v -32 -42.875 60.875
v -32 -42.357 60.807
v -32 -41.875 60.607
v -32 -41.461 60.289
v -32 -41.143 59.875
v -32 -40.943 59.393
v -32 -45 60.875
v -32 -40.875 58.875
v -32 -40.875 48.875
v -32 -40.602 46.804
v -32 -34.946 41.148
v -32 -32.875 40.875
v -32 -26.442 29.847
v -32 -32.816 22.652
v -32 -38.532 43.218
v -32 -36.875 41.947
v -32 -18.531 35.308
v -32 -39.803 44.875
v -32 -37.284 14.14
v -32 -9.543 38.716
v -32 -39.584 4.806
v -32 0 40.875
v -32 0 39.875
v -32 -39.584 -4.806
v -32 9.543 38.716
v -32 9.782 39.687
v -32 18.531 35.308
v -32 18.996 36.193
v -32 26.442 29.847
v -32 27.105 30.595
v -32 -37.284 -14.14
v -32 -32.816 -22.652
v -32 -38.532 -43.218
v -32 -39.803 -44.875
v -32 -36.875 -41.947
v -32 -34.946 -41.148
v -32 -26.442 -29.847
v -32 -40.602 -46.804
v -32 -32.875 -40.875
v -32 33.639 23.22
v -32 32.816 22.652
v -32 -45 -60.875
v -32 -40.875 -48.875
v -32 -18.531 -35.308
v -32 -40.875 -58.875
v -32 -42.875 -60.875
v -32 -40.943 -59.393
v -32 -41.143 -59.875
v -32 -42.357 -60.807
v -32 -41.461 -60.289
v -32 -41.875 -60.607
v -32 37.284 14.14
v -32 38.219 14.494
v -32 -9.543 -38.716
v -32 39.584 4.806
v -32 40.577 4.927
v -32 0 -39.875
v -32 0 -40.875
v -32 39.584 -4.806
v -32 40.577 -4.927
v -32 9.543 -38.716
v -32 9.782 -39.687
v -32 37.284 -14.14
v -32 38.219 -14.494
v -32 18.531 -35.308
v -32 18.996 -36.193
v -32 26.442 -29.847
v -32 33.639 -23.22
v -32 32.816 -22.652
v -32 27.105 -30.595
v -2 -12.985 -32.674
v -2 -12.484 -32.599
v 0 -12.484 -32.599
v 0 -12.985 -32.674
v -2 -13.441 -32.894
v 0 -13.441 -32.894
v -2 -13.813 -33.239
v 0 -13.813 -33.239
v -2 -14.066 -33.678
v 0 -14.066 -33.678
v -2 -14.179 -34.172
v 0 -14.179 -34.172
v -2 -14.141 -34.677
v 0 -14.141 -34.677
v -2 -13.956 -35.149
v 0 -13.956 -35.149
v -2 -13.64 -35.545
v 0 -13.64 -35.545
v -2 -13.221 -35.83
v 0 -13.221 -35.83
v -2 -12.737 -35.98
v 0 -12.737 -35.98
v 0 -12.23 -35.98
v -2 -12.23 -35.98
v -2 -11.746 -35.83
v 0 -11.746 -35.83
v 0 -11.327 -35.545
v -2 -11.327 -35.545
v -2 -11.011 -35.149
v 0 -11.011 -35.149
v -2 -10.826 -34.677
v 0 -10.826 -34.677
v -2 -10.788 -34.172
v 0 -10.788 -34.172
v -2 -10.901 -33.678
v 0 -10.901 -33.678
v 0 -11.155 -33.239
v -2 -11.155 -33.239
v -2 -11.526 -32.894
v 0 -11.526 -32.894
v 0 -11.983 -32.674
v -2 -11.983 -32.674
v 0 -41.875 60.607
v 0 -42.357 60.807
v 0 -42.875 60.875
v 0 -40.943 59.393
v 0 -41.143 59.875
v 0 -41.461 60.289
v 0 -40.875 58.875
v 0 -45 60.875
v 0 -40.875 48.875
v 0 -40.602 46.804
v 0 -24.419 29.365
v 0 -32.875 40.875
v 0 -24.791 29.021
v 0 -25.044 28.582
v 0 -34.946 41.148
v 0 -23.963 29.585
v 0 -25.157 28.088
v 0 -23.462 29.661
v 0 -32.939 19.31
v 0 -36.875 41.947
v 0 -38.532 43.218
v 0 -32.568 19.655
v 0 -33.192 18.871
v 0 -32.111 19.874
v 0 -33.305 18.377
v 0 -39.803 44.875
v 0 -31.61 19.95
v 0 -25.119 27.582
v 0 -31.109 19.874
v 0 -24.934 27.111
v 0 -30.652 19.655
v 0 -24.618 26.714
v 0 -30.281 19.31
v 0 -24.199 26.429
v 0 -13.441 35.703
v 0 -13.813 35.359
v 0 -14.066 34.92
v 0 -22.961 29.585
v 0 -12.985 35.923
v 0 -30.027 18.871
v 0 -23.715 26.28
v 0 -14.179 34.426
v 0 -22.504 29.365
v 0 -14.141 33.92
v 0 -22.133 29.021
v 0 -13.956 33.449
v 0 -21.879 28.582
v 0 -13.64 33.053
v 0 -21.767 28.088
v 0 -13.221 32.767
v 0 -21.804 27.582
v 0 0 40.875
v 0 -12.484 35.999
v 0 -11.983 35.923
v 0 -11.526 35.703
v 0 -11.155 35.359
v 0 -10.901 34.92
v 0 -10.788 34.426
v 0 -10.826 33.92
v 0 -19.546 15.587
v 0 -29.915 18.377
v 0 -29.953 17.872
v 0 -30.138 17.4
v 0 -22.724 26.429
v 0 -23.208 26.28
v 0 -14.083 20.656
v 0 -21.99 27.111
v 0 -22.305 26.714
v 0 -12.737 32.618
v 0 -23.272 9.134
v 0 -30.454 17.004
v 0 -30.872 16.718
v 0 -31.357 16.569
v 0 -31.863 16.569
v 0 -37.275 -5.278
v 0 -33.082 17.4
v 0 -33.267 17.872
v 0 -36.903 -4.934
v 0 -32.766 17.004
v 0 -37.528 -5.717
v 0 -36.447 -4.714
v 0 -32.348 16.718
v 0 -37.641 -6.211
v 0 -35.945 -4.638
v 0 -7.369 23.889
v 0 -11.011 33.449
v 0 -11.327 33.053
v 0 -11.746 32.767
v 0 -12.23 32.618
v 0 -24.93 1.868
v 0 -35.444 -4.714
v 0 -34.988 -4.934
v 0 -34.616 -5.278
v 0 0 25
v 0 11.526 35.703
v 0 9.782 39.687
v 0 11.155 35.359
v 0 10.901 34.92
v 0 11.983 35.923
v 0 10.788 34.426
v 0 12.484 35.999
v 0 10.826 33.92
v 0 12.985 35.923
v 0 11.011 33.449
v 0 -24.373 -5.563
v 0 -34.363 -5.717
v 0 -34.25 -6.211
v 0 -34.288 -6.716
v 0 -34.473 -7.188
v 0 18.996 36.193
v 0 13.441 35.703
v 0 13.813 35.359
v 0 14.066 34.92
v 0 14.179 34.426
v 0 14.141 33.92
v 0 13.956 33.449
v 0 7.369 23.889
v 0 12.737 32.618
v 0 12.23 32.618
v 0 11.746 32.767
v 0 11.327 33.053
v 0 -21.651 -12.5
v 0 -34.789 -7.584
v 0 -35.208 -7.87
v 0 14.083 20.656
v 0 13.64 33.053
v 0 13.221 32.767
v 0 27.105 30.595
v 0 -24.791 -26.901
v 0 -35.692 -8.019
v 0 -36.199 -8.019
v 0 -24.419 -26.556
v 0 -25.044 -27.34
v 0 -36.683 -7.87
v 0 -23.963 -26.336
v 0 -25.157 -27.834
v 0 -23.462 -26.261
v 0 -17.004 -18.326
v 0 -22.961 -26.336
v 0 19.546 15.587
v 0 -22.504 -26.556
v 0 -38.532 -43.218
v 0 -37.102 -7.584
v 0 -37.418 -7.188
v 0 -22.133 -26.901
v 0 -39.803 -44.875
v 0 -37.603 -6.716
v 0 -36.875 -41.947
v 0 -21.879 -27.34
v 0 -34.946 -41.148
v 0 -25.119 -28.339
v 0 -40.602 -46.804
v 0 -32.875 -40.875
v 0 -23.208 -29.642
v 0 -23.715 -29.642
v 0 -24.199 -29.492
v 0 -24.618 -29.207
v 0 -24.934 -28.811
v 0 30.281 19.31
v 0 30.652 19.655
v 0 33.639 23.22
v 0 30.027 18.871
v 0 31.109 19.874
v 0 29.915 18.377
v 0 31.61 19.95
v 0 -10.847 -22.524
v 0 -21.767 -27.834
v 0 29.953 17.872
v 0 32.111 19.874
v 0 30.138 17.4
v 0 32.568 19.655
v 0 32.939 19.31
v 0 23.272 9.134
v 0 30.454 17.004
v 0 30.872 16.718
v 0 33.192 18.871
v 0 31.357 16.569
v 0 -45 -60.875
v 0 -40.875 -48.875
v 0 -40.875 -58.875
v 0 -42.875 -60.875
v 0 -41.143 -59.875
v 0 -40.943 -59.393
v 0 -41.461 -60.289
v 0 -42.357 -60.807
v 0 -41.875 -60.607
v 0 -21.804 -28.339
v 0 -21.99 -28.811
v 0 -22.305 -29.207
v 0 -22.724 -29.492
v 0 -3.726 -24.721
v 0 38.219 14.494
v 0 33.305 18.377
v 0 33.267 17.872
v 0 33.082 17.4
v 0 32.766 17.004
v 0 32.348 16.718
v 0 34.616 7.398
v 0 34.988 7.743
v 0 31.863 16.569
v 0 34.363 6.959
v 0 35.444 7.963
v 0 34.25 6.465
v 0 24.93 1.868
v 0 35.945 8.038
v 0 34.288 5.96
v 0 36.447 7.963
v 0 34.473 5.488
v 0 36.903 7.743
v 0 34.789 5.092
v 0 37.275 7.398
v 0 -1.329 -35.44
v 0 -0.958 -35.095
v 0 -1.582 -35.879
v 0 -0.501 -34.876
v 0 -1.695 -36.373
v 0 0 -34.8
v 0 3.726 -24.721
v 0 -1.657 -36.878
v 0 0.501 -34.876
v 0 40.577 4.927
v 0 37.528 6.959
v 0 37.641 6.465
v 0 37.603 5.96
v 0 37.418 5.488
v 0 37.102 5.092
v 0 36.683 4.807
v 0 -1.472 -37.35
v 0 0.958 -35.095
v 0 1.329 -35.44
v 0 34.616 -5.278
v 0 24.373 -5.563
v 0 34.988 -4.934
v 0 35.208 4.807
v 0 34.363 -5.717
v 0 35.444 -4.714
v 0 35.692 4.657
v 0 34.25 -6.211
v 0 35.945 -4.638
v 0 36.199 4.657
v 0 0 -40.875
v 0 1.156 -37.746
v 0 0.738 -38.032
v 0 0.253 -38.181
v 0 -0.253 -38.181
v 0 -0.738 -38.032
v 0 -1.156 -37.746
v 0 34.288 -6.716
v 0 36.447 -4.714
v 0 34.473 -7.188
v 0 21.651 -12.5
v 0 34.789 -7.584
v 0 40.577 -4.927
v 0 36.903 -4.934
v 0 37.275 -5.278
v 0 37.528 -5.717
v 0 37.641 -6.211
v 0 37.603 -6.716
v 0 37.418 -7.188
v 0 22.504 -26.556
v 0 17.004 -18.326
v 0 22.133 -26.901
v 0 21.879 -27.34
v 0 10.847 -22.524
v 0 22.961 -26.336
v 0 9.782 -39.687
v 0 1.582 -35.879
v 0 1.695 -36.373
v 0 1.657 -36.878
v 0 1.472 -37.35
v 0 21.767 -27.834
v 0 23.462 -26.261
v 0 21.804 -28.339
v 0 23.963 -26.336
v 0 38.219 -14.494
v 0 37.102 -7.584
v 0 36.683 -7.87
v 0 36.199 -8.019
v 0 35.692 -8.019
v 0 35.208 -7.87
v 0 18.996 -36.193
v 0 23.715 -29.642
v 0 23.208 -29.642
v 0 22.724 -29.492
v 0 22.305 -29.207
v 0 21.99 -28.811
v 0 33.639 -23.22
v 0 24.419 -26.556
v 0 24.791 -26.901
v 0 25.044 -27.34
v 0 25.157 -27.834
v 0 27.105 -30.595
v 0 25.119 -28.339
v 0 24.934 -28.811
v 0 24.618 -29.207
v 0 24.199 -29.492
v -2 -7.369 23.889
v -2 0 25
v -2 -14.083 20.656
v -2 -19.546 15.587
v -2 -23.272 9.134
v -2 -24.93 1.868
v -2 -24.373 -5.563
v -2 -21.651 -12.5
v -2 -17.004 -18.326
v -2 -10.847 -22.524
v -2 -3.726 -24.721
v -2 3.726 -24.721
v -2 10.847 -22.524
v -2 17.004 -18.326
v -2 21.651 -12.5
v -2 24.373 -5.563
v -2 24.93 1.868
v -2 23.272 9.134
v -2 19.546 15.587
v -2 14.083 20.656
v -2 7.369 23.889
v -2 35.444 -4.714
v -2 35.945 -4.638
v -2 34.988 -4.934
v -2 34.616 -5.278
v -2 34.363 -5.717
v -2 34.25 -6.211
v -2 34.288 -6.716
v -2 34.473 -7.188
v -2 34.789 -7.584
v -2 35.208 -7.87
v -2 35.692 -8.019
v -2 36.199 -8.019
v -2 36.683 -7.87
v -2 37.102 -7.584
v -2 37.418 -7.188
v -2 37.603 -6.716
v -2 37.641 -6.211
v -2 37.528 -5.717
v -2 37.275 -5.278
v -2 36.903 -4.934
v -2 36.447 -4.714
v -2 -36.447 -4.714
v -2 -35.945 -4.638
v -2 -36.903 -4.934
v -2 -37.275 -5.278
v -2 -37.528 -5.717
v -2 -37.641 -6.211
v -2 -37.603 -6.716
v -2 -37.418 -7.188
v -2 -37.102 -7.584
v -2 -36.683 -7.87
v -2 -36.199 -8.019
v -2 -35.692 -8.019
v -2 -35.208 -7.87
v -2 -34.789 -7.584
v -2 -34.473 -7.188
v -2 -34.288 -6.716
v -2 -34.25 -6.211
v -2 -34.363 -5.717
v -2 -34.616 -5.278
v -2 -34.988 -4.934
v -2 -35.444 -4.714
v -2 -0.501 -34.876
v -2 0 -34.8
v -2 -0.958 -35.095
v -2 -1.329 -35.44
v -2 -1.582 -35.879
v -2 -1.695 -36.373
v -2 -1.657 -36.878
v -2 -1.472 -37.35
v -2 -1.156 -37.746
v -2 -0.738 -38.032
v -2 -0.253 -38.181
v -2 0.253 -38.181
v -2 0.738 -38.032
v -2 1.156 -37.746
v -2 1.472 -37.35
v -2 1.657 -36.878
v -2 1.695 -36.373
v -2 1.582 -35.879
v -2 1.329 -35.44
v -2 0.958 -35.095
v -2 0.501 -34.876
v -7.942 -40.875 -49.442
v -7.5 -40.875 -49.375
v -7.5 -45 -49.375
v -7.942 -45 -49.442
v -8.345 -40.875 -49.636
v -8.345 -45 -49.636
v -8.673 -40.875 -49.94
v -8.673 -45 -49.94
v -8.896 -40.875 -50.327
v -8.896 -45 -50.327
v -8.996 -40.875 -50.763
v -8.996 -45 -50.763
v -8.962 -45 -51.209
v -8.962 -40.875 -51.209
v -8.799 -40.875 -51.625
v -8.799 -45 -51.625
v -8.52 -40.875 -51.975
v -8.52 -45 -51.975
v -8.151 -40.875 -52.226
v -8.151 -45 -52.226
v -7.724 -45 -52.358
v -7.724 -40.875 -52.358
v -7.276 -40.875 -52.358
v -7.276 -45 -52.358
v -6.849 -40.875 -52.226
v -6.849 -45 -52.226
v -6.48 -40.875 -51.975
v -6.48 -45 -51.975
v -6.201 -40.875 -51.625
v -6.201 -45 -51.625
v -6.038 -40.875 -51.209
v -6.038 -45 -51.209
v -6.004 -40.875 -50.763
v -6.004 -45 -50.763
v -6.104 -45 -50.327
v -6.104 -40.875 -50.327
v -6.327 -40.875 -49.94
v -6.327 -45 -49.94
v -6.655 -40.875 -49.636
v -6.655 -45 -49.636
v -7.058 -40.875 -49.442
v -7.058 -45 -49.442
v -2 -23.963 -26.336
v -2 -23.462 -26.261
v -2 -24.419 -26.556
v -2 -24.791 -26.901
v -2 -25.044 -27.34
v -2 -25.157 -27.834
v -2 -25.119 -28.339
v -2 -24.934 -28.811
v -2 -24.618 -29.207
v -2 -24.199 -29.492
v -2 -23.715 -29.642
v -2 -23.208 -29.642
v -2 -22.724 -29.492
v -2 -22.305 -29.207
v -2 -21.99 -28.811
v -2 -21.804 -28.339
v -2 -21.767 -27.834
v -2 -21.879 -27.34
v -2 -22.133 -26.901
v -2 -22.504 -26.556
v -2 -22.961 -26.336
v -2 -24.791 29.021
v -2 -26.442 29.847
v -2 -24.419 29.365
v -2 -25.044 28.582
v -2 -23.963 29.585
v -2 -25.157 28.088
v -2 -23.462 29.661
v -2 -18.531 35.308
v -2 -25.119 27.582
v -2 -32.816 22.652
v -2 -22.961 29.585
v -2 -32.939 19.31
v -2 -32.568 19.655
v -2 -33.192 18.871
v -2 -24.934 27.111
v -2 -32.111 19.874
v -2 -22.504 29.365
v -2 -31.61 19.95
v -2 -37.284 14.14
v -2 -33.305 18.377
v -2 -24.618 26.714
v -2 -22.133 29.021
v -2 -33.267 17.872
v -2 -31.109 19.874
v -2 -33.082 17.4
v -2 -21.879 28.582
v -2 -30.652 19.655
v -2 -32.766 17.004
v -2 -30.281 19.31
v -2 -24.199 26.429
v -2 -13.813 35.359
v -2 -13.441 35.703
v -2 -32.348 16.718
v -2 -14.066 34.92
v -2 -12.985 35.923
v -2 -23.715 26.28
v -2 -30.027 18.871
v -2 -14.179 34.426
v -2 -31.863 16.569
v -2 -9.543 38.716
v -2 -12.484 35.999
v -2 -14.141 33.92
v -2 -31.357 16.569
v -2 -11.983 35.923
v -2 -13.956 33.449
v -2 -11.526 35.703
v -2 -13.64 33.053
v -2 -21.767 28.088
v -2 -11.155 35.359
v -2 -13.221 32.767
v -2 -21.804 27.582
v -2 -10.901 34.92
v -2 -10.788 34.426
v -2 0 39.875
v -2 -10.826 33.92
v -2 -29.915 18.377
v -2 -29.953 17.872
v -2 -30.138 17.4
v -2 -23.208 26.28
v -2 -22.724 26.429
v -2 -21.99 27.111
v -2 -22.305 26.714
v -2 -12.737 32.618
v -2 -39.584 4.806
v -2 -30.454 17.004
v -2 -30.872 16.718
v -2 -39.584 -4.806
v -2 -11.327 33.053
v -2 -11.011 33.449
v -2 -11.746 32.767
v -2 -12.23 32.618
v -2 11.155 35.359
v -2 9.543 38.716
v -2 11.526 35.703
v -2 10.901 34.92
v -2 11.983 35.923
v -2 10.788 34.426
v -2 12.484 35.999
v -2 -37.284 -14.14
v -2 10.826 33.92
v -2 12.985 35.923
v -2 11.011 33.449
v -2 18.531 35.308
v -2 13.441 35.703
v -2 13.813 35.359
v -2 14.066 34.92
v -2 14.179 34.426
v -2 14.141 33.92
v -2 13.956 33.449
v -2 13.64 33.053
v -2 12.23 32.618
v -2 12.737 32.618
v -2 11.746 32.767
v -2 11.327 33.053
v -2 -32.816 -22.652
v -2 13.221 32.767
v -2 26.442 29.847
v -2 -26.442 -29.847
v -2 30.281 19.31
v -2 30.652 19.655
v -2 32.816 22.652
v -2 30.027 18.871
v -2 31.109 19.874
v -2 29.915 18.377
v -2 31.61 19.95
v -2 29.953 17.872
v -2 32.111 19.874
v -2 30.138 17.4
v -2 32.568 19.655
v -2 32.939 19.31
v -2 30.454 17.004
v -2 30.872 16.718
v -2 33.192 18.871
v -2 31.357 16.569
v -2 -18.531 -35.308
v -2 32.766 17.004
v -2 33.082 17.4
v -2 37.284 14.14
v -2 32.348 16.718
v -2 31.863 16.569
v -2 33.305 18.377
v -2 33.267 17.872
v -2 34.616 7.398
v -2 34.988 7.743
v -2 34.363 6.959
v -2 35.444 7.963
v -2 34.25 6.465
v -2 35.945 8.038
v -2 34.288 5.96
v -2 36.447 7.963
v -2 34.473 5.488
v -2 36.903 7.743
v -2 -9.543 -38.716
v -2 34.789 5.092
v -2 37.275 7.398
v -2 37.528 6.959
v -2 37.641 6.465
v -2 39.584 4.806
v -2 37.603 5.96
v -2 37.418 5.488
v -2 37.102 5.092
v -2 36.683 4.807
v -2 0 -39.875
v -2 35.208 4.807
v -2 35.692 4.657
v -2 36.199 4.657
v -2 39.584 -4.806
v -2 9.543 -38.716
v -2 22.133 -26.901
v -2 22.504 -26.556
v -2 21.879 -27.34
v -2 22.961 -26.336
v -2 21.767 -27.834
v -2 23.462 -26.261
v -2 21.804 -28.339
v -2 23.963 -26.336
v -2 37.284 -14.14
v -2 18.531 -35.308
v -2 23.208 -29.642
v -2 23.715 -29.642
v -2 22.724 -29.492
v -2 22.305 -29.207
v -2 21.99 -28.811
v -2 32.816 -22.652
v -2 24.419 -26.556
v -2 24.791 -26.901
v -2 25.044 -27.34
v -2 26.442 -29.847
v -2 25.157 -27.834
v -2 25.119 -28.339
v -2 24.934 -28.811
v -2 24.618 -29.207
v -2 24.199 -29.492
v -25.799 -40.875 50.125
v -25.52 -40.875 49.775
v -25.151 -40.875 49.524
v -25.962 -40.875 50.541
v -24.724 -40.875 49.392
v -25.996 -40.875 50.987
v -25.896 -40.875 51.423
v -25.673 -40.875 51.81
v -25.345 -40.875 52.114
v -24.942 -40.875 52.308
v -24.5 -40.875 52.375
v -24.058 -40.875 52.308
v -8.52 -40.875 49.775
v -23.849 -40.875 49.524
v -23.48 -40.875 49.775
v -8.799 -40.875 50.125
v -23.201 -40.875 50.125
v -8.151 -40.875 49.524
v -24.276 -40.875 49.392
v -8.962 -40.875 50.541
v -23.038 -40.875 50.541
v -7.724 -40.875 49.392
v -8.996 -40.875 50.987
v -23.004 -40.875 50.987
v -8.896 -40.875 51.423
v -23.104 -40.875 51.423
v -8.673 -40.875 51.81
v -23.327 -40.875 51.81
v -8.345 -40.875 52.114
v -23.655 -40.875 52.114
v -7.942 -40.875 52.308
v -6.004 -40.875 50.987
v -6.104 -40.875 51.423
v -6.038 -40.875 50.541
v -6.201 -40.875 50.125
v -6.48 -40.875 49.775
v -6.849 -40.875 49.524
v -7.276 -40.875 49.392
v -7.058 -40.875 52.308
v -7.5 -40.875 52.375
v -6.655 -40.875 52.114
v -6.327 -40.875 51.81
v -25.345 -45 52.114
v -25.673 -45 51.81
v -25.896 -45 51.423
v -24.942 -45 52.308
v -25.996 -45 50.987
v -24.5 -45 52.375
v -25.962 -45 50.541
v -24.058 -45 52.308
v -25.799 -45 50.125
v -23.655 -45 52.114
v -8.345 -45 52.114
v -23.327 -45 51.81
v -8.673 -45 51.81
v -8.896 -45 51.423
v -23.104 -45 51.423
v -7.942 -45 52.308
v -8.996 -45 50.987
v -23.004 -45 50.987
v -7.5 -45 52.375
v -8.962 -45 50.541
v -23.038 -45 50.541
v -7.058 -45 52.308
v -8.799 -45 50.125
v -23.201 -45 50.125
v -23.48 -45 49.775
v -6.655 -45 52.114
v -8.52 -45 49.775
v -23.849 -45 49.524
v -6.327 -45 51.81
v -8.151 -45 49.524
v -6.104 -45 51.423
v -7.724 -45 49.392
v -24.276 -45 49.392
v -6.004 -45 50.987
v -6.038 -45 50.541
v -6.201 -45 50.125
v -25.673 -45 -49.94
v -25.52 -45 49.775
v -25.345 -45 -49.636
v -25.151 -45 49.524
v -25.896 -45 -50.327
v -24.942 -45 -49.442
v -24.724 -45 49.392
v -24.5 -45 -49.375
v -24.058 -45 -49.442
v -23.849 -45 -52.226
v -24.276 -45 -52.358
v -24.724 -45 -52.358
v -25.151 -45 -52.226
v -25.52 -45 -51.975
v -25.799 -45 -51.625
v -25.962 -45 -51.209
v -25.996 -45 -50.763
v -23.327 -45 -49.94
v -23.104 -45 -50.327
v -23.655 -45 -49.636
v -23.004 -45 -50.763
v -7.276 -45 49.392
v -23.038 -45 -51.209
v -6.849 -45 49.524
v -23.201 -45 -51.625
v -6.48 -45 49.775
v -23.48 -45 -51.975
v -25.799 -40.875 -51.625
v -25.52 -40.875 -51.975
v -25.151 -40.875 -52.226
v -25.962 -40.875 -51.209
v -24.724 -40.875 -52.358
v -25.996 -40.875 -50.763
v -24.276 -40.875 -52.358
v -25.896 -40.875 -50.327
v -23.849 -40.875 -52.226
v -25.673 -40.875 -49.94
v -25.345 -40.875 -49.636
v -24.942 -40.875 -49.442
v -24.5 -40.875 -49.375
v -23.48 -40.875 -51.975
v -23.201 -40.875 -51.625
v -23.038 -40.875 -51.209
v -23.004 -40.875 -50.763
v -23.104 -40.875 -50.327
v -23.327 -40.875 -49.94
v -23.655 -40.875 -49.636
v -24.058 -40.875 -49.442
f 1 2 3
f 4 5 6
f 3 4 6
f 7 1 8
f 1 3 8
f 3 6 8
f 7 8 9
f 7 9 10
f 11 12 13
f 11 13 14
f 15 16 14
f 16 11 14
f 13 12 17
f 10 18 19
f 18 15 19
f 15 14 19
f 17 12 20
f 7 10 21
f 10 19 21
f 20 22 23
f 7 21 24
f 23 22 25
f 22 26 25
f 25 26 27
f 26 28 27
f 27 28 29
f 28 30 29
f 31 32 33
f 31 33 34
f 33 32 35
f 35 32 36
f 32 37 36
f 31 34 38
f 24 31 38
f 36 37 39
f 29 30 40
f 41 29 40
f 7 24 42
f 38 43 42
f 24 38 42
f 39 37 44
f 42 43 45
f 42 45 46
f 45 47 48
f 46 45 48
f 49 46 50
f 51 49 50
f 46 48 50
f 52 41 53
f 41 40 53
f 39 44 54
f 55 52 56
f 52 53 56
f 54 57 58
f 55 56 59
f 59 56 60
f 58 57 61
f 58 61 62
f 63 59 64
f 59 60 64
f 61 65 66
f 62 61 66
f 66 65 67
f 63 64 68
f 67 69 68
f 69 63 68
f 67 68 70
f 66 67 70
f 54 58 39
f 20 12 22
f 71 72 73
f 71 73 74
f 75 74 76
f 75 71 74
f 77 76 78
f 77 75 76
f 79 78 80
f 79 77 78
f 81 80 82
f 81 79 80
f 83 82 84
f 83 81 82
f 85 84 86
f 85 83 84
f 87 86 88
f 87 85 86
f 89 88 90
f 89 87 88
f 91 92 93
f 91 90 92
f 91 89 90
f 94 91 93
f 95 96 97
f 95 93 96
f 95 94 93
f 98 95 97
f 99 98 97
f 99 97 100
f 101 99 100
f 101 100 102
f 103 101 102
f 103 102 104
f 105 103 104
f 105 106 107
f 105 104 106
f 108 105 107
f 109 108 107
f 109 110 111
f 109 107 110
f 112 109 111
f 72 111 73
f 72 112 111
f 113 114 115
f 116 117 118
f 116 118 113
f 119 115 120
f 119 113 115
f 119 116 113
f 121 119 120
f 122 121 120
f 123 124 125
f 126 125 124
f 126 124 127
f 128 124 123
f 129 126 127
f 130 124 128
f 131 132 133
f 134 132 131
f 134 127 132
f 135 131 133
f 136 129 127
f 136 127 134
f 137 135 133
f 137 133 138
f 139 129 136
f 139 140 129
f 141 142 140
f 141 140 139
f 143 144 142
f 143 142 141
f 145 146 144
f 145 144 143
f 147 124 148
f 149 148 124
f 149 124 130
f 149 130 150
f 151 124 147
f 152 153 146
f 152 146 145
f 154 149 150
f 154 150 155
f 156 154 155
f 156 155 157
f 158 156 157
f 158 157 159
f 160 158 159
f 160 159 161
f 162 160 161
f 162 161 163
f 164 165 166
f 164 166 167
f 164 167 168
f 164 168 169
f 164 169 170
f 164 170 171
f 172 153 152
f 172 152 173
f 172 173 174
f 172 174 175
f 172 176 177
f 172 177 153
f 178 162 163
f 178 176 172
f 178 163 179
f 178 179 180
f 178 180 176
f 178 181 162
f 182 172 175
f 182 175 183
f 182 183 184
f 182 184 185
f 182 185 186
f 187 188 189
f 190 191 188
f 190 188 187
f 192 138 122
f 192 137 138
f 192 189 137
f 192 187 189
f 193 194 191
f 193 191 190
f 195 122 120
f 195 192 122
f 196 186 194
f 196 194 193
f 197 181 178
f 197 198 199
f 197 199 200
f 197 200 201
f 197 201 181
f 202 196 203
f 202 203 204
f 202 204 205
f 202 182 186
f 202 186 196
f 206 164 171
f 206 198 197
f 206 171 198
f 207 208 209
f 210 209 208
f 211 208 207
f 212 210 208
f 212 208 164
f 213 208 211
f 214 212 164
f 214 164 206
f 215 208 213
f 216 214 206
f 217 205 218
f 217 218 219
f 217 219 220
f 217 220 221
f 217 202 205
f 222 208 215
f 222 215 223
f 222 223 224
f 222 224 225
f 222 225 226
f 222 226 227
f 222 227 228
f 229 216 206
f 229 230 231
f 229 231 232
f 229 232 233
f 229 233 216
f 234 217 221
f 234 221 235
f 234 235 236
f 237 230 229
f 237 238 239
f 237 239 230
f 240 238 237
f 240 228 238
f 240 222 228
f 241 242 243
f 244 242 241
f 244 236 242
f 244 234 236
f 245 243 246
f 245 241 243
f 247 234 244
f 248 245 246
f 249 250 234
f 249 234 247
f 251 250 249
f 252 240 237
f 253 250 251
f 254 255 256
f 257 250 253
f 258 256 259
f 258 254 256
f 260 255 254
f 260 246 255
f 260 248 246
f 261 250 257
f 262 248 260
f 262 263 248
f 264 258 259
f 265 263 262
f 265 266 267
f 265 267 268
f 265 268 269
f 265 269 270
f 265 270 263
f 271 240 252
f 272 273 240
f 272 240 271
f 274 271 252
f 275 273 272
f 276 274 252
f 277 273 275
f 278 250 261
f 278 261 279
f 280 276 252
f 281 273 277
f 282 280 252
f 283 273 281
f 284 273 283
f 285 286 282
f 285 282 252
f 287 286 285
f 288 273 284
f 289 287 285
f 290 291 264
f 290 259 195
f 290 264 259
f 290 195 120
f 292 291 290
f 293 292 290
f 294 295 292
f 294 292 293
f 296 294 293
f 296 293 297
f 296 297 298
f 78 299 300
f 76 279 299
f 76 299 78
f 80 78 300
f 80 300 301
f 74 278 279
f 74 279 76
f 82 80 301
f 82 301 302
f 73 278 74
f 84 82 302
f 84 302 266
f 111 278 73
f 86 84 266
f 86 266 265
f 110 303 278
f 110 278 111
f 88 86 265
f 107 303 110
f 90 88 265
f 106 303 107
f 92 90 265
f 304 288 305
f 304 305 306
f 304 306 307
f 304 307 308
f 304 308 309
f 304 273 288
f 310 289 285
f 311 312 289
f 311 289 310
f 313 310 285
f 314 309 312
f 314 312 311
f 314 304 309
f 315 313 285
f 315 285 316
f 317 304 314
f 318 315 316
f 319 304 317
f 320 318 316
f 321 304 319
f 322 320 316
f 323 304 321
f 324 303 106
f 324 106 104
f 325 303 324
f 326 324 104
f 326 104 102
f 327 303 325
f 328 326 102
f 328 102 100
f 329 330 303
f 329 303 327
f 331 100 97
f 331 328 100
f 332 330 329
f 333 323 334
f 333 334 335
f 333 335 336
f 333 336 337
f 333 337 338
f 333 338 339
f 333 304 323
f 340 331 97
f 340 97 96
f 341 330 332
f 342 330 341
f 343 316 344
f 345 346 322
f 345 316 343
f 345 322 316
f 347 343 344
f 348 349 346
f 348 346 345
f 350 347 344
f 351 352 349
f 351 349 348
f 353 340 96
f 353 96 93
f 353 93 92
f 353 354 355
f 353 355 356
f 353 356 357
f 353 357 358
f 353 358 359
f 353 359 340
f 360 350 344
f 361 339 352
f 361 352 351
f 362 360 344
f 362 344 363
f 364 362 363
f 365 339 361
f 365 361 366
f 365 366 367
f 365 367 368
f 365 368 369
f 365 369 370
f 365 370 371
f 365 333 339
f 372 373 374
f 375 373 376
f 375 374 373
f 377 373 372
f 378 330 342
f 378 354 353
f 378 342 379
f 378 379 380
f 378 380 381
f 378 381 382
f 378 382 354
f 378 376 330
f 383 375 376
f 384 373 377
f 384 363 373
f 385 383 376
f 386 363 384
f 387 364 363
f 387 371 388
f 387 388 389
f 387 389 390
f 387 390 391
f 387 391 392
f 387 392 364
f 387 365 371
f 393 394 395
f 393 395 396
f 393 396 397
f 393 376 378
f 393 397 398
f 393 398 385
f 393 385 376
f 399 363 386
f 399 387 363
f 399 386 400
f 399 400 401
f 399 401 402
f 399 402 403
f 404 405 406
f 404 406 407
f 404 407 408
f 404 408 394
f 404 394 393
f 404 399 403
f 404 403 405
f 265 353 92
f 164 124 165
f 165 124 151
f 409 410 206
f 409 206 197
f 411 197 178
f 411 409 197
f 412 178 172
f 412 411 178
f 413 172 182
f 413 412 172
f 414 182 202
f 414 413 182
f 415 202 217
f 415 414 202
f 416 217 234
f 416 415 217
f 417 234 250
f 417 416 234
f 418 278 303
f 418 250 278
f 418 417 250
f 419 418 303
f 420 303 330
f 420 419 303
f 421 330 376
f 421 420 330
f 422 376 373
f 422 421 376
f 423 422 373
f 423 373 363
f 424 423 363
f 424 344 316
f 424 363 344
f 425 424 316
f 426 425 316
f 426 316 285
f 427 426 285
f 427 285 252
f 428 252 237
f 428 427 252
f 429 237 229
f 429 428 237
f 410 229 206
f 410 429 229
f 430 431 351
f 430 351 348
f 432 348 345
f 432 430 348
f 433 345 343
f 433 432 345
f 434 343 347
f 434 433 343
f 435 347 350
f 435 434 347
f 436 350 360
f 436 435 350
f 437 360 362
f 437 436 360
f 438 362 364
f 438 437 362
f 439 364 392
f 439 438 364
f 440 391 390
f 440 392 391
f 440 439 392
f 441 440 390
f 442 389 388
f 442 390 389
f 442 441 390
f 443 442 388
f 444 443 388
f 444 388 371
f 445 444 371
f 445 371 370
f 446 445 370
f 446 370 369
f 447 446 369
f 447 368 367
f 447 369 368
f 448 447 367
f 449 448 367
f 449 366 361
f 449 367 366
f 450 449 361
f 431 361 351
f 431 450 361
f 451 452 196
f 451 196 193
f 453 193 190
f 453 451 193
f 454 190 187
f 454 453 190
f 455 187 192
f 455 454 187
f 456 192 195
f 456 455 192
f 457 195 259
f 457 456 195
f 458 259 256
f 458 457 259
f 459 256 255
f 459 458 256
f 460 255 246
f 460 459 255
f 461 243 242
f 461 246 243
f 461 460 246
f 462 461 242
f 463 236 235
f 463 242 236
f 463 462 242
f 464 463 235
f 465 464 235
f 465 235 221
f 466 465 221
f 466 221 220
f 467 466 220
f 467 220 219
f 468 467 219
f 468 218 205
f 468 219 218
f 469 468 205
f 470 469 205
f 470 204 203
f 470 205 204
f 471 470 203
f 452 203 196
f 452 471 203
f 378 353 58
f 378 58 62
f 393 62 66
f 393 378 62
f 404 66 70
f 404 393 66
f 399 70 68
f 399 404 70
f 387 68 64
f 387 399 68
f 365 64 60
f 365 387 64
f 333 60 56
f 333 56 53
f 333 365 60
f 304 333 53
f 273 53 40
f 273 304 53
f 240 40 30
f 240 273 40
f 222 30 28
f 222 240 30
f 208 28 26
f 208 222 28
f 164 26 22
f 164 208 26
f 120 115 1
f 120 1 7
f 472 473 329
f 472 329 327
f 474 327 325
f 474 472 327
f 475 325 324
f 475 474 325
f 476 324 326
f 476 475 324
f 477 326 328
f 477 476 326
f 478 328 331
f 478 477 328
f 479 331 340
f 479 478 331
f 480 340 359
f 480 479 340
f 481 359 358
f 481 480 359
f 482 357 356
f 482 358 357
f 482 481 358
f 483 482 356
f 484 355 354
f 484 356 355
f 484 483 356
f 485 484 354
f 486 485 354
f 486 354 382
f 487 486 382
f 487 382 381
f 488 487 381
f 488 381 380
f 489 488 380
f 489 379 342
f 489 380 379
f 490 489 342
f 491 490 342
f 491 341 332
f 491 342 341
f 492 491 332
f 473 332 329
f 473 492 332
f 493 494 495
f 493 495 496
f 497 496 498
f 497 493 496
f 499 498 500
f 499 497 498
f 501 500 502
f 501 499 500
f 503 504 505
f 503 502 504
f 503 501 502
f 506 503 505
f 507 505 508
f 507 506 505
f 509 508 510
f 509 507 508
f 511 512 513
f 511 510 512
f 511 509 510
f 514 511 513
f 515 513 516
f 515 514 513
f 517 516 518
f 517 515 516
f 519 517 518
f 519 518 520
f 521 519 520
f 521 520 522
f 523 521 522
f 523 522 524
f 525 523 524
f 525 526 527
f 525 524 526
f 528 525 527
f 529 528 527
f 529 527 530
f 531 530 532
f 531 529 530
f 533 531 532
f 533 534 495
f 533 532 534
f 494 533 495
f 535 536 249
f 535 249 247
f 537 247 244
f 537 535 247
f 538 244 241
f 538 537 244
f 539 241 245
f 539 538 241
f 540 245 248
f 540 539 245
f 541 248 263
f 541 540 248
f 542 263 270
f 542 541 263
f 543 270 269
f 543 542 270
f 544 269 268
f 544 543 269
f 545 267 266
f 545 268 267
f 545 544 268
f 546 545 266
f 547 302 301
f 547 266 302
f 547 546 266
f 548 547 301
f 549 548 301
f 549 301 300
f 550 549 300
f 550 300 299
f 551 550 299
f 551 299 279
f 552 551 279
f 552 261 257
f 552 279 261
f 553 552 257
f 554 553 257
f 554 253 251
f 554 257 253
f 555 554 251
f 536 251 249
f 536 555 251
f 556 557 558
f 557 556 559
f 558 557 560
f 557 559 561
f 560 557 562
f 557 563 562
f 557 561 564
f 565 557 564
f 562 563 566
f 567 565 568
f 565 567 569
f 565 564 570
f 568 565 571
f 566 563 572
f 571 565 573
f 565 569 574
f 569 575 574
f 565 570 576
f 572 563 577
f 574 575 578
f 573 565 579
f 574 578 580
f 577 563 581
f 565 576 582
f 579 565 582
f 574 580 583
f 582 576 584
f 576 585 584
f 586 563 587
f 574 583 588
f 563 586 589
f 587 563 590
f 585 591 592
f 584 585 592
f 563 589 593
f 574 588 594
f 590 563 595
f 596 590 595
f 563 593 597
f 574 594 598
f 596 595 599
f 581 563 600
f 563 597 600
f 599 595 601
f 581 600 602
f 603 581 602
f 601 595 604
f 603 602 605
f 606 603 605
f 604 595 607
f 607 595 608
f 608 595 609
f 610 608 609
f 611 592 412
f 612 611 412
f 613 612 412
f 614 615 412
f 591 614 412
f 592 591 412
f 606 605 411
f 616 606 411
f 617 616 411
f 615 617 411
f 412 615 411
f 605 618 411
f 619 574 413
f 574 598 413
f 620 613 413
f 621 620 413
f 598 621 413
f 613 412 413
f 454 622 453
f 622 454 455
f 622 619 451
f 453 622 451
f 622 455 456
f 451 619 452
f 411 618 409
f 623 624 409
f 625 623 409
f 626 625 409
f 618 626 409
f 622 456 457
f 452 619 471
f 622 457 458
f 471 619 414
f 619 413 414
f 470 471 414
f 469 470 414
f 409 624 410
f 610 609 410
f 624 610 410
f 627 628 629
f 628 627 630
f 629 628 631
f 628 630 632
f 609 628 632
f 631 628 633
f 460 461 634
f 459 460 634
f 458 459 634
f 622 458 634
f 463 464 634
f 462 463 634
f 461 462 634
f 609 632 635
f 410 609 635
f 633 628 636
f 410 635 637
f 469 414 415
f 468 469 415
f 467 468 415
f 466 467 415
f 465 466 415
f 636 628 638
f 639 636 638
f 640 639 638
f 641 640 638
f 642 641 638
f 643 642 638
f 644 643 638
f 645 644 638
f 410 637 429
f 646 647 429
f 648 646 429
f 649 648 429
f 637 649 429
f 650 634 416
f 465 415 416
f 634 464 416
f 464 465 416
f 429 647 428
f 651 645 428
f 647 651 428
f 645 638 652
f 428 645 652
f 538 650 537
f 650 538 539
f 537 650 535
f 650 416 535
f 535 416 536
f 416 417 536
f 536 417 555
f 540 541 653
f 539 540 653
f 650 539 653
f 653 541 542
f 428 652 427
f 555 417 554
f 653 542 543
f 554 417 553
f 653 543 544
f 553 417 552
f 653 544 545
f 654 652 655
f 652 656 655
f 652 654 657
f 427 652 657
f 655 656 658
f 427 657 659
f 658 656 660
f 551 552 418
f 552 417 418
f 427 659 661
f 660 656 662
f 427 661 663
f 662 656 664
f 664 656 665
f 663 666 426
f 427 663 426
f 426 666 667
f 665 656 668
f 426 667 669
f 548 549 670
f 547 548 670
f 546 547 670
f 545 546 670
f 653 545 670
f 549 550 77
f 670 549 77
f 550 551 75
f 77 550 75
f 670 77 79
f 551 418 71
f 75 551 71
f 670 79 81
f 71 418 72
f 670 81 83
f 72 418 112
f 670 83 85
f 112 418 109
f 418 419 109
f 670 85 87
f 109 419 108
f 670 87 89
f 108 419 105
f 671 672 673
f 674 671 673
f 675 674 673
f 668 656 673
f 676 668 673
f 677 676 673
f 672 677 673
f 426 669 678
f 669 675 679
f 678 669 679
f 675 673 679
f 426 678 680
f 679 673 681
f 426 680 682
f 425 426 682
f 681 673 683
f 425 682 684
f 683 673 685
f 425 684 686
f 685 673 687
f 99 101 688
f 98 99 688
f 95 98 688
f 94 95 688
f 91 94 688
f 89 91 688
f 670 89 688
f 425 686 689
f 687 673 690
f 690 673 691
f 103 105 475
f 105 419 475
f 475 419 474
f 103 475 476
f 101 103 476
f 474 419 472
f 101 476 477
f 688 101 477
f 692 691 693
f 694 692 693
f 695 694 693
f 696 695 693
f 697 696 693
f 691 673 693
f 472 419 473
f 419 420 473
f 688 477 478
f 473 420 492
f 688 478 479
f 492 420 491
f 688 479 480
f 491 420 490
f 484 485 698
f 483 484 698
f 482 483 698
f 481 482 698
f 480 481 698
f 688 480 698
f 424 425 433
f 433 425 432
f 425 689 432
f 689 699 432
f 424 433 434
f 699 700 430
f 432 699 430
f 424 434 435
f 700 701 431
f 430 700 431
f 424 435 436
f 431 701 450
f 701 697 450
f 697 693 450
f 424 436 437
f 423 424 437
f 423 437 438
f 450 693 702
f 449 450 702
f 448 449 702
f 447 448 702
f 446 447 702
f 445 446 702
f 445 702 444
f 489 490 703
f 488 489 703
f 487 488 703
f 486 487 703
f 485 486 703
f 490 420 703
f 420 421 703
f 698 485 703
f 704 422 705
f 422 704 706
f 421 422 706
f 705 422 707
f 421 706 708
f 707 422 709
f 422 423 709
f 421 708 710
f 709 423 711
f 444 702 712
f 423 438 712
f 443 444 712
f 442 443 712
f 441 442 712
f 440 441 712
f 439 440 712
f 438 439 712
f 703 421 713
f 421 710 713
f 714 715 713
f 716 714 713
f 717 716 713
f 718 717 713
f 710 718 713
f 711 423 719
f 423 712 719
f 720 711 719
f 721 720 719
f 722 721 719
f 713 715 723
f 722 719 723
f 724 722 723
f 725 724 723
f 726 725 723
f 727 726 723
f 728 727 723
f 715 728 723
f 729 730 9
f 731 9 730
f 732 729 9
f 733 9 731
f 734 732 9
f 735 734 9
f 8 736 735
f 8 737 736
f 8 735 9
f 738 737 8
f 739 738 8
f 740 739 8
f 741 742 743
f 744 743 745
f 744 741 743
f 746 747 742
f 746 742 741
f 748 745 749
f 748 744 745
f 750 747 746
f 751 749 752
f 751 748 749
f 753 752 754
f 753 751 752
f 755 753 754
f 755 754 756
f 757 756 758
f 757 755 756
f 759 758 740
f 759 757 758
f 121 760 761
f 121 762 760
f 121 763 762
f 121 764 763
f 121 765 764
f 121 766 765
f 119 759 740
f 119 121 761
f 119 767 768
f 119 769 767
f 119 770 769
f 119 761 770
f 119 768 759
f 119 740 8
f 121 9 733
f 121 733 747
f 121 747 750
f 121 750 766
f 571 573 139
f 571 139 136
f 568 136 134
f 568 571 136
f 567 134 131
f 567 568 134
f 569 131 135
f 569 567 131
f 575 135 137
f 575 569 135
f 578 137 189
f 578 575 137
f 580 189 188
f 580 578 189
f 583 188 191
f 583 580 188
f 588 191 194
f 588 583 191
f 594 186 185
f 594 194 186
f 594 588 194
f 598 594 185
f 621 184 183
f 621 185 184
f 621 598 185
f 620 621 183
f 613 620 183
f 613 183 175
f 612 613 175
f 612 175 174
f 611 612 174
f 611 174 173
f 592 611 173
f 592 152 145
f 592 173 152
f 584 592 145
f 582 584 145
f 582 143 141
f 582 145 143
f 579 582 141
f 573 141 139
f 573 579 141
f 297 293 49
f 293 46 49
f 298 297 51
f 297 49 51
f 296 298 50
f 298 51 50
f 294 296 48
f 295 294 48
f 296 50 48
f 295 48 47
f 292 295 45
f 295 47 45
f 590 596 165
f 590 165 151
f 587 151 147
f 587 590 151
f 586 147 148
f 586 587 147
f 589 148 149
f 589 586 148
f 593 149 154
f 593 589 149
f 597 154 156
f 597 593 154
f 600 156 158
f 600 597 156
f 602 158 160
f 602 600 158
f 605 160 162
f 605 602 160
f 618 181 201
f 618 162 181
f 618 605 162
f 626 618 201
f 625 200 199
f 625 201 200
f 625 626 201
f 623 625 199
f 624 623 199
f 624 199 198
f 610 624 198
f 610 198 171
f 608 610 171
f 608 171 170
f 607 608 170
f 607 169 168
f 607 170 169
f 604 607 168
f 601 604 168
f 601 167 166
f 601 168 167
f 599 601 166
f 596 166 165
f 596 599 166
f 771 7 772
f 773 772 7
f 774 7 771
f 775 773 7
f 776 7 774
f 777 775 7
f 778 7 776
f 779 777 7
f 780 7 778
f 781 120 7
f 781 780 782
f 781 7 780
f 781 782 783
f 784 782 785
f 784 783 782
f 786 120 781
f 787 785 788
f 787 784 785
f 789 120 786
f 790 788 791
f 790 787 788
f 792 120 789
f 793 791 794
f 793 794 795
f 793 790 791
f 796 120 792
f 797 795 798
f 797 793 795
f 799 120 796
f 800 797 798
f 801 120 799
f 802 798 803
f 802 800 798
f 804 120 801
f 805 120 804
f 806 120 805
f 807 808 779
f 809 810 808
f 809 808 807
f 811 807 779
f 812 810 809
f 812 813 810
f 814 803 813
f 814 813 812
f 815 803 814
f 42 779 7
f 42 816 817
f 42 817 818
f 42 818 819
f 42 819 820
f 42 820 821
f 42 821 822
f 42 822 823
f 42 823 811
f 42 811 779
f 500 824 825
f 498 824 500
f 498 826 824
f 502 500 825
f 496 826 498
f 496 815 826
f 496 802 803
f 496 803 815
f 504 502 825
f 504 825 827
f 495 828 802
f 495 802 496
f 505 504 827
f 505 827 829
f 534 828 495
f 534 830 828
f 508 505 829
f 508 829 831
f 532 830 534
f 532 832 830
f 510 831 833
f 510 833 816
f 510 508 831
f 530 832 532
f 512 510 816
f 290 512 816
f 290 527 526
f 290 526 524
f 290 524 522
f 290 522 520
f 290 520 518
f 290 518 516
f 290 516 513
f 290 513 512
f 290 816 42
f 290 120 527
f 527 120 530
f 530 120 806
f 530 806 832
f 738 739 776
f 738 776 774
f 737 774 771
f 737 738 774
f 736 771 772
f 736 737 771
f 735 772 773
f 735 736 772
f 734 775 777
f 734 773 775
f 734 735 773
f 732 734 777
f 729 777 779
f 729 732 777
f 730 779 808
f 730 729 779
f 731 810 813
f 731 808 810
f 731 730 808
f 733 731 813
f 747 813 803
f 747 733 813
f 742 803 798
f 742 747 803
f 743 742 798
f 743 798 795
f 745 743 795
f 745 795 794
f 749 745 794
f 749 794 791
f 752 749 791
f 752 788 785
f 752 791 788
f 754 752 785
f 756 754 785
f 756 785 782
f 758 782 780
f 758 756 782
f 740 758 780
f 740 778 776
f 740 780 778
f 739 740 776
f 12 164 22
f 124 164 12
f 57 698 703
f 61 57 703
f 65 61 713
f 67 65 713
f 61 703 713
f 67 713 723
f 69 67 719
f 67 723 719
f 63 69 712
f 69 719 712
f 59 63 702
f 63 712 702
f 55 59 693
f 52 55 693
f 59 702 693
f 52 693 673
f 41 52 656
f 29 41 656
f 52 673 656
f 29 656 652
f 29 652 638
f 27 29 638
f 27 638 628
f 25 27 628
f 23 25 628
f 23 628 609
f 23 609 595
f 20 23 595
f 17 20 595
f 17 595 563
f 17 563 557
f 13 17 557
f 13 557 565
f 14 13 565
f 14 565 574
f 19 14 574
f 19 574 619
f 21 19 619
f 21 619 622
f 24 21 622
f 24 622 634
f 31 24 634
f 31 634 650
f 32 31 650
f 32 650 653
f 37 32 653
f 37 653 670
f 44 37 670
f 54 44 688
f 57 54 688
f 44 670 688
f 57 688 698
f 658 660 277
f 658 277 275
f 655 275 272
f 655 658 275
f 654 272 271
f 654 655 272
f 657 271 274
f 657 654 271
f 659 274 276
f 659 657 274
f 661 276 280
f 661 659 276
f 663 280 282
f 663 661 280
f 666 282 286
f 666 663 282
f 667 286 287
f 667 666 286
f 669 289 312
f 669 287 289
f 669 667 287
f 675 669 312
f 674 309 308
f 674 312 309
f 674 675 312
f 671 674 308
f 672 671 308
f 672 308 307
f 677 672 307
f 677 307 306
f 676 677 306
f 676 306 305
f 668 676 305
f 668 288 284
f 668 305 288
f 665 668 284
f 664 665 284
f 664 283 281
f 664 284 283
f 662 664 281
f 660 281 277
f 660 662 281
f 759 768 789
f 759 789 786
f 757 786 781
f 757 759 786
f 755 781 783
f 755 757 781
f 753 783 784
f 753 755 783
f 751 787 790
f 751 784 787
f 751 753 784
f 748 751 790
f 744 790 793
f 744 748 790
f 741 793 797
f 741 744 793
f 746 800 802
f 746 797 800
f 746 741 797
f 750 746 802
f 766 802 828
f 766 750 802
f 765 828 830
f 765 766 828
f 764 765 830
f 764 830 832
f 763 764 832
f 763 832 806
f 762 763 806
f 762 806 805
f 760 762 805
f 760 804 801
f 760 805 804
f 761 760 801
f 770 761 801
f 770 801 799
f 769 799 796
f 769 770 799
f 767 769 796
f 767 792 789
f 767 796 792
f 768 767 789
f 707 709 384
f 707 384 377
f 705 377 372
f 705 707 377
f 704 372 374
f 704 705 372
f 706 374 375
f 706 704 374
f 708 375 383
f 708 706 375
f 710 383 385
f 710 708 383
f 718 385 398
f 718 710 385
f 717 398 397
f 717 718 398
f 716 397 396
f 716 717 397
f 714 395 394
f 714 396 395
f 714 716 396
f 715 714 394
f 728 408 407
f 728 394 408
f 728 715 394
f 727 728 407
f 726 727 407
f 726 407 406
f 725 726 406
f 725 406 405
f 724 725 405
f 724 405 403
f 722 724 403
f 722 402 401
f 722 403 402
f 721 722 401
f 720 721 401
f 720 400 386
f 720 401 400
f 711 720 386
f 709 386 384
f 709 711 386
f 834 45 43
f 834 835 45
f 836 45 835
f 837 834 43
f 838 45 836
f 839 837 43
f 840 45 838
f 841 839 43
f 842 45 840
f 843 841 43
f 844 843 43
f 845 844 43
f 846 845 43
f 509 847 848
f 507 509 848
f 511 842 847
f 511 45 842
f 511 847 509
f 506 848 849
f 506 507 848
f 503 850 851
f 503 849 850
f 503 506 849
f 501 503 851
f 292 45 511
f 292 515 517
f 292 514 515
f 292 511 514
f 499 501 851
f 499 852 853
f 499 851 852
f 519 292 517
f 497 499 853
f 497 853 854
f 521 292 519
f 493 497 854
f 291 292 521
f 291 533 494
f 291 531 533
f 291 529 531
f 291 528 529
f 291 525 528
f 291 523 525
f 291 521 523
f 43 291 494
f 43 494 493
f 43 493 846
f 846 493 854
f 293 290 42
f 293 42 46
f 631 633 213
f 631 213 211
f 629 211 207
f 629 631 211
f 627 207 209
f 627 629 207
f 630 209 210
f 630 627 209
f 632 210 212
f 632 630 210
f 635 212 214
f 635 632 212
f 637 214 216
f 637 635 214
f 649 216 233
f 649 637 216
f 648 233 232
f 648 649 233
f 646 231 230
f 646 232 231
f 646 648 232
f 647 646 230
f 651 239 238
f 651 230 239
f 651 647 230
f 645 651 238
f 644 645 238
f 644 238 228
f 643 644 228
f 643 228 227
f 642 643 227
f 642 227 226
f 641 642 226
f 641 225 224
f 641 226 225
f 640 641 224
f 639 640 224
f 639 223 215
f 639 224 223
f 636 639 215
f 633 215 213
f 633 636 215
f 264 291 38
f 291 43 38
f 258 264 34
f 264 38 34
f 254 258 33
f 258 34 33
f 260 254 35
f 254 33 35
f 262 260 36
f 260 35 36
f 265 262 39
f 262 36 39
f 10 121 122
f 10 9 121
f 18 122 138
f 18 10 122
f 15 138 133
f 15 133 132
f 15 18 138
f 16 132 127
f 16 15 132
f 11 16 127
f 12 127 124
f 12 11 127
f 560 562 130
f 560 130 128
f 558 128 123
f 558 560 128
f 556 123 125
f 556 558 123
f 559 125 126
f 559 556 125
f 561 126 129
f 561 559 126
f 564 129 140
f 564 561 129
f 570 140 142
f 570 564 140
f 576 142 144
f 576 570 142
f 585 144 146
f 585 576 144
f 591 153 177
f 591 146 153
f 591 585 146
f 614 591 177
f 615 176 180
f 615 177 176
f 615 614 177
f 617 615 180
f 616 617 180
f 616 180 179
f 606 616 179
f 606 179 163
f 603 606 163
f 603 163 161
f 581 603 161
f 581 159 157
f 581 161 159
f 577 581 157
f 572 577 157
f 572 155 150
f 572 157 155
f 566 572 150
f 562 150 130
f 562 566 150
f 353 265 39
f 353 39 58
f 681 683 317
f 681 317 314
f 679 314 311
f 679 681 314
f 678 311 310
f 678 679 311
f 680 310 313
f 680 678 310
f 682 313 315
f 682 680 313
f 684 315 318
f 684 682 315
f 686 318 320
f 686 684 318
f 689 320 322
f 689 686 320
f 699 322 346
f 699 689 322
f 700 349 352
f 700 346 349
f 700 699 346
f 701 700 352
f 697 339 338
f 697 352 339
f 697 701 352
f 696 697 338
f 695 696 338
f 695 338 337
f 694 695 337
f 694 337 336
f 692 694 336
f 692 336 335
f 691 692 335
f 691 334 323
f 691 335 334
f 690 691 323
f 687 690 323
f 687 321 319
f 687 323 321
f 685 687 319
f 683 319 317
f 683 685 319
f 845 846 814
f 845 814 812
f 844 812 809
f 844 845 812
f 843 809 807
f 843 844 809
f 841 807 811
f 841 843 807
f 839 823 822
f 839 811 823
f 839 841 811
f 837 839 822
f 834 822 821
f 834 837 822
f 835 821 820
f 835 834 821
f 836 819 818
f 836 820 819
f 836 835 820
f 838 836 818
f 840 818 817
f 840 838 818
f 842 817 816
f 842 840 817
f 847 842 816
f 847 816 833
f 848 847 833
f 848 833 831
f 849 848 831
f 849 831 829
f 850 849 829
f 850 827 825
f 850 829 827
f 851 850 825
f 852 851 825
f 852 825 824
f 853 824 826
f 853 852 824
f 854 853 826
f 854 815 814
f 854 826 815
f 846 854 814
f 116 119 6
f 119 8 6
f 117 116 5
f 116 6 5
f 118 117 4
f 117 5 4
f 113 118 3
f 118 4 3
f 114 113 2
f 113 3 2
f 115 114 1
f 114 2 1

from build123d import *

# Parameters (mm, degrees)
BOSS_EXTRUDE2_DEPTH     = 32
CUT_EXTRUDE1_DEPTH      = 10
CUT_EXTRUDE1_DEPTH_BACK = 40
SKETCH2_R               = 25
CUT_EXTRUDE2_START      = -2
SKETCH3_R               = 39.875
CUT_EXTRUDE2_DEPTH      = 40
FILLET1_R               = 8
FILLET2_R               = 2
CUT_EXTRUDE3_DEPTH      = 10
CUT_EXTRUDE3_DEPTH_BACK = 10
SKETCH5_R               = 1.7
CUT_EXTRUDE4_DEPTH      = 5
CUT_EXTRUDE4_DEPTH_BACK = 7
SKETCH6_R               = 1.5


with BuildPart() as part:
    # Sketch4 → Boss-Extrude2 (new body)
    with BuildSketch(Plane(origin=(0, 0, 0), x_dir=(0, 0, -1), z_dir=(1, 0, 0))):
        with BuildLine():
            Line((-60.875, -40.875), (-60.875, -45))
            Line((-60.875, -45), (60.875, -45))
            Line((60.875, -45), (60.875, -40.875))
            Line((60.875, -40.875), (40.875, -40.875))
            Line((40.875, -40.875), (40.875, 0))
            ThreePointArc((40.875, 0), (0, 40.875), (-40.875, 0))
            Line((-40.875, 0), (-40.875, -40.875))
            Line((-40.875, -40.875), (-60.875, -40.875))
        make_face()
    extrude(amount=-BOSS_EXTRUDE2_DEPTH)

    # Sketch2 → Cut-Extrude1 (cut, two sides: drawn at the far end of the back side and taken through both)
    with BuildSketch(Plane(origin=(0, 0, 0), x_dir=(0, 0, -1), z_dir=(1, 0, 0)).offset(-CUT_EXTRUDE1_DEPTH_BACK)):
        Circle(SKETCH2_R)
    extrude(amount=CUT_EXTRUDE1_DEPTH + CUT_EXTRUDE1_DEPTH_BACK, mode=Mode.SUBTRACT)

    # Sketch3 → Cut-Extrude2 (cut)
    with BuildSketch(Plane(origin=(0, 0, 0), x_dir=(0, 0, -1), z_dir=(1, 0, 0)).offset(CUT_EXTRUDE2_START)):
        Circle(SKETCH3_R)
    extrude(amount=-CUT_EXTRUDE2_DEPTH, mode=Mode.SUBTRACT)

    # Fillet1
    fillet1_edges = [part.edges().sort_by_distance(p)[0] for p in [
        (-16, -40.875, 40.875),
        (-16, -40.875, -40.875),
    ]]
    fillet(fillet1_edges, radius=FILLET1_R)

    # Fillet2
    fillet2_edges = [part.edges().sort_by_distance(p)[0] for p in [
        (-16, -40.875, -60.875),
        (-16, -40.875, 60.875),
    ]]
    fillet(fillet2_edges, radius=FILLET2_R)

    # Sketch5 → Cut-Extrude3 (cut, two sides: drawn at the far end of the back side and taken through both)
    with BuildSketch(Plane(origin=(0, 0, 0), x_dir=(0, 0, -1), z_dir=(1, 0, 0)).offset(-CUT_EXTRUDE3_DEPTH_BACK)):
        with Locations((36.5, 0)):
            Circle(SKETCH5_R)
        with Locations((27.960622174, -23.461747754)):
            Circle(SKETCH5_R)
        with Locations((6.338158485, -35.945482985)):
            Circle(SKETCH5_R)
        with Locations((-18.25, -31.609927238)):
            Circle(SKETCH5_R)
        with Locations((-34.298780659, -12.483735231)):
            Circle(SKETCH5_R)
        with Locations((-34.298780659, 12.483735231)):
            Circle(SKETCH5_R)
        with Locations((-18.25, 31.609927238)):
            Circle(SKETCH5_R)
        with Locations((6.338158485, 35.945482985)):
            Circle(SKETCH5_R)
        with Locations((27.960622174, 23.461747754)):
            Circle(SKETCH5_R)
        with Locations((34.298780659, -12.483735231)):
            Circle(SKETCH5_R)
        with Locations((-27.960622174, -23.461747754)):
            Circle(SKETCH5_R)
        with Locations((-6.338158485, 35.945482985)):
            Circle(SKETCH5_R)
    extrude(amount=CUT_EXTRUDE3_DEPTH + CUT_EXTRUDE3_DEPTH_BACK, mode=Mode.SUBTRACT)

    # Sketch6 → Cut-Extrude4 (cut, two sides: drawn at the far end of the back side and taken through both)
    with BuildSketch(Plane(origin=(0, -45, 0), x_dir=(-1, 0, 0), z_dir=(0, -1, 0)).offset(-CUT_EXTRUDE4_DEPTH_BACK)):
        with Locations((7.5, 50.875)):
            Circle(SKETCH6_R)
        with Locations((24.5, 50.875)):
            Circle(SKETCH6_R)
        with Locations((24.5, -50.875)):
            Circle(SKETCH6_R)
        with Locations((7.5, -50.875)):
            Circle(SKETCH6_R)
    extrude(amount=CUT_EXTRUDE4_DEPTH + CUT_EXTRUDE4_DEPTH_BACK, mode=Mode.SUBTRACT)


solid = part.part
